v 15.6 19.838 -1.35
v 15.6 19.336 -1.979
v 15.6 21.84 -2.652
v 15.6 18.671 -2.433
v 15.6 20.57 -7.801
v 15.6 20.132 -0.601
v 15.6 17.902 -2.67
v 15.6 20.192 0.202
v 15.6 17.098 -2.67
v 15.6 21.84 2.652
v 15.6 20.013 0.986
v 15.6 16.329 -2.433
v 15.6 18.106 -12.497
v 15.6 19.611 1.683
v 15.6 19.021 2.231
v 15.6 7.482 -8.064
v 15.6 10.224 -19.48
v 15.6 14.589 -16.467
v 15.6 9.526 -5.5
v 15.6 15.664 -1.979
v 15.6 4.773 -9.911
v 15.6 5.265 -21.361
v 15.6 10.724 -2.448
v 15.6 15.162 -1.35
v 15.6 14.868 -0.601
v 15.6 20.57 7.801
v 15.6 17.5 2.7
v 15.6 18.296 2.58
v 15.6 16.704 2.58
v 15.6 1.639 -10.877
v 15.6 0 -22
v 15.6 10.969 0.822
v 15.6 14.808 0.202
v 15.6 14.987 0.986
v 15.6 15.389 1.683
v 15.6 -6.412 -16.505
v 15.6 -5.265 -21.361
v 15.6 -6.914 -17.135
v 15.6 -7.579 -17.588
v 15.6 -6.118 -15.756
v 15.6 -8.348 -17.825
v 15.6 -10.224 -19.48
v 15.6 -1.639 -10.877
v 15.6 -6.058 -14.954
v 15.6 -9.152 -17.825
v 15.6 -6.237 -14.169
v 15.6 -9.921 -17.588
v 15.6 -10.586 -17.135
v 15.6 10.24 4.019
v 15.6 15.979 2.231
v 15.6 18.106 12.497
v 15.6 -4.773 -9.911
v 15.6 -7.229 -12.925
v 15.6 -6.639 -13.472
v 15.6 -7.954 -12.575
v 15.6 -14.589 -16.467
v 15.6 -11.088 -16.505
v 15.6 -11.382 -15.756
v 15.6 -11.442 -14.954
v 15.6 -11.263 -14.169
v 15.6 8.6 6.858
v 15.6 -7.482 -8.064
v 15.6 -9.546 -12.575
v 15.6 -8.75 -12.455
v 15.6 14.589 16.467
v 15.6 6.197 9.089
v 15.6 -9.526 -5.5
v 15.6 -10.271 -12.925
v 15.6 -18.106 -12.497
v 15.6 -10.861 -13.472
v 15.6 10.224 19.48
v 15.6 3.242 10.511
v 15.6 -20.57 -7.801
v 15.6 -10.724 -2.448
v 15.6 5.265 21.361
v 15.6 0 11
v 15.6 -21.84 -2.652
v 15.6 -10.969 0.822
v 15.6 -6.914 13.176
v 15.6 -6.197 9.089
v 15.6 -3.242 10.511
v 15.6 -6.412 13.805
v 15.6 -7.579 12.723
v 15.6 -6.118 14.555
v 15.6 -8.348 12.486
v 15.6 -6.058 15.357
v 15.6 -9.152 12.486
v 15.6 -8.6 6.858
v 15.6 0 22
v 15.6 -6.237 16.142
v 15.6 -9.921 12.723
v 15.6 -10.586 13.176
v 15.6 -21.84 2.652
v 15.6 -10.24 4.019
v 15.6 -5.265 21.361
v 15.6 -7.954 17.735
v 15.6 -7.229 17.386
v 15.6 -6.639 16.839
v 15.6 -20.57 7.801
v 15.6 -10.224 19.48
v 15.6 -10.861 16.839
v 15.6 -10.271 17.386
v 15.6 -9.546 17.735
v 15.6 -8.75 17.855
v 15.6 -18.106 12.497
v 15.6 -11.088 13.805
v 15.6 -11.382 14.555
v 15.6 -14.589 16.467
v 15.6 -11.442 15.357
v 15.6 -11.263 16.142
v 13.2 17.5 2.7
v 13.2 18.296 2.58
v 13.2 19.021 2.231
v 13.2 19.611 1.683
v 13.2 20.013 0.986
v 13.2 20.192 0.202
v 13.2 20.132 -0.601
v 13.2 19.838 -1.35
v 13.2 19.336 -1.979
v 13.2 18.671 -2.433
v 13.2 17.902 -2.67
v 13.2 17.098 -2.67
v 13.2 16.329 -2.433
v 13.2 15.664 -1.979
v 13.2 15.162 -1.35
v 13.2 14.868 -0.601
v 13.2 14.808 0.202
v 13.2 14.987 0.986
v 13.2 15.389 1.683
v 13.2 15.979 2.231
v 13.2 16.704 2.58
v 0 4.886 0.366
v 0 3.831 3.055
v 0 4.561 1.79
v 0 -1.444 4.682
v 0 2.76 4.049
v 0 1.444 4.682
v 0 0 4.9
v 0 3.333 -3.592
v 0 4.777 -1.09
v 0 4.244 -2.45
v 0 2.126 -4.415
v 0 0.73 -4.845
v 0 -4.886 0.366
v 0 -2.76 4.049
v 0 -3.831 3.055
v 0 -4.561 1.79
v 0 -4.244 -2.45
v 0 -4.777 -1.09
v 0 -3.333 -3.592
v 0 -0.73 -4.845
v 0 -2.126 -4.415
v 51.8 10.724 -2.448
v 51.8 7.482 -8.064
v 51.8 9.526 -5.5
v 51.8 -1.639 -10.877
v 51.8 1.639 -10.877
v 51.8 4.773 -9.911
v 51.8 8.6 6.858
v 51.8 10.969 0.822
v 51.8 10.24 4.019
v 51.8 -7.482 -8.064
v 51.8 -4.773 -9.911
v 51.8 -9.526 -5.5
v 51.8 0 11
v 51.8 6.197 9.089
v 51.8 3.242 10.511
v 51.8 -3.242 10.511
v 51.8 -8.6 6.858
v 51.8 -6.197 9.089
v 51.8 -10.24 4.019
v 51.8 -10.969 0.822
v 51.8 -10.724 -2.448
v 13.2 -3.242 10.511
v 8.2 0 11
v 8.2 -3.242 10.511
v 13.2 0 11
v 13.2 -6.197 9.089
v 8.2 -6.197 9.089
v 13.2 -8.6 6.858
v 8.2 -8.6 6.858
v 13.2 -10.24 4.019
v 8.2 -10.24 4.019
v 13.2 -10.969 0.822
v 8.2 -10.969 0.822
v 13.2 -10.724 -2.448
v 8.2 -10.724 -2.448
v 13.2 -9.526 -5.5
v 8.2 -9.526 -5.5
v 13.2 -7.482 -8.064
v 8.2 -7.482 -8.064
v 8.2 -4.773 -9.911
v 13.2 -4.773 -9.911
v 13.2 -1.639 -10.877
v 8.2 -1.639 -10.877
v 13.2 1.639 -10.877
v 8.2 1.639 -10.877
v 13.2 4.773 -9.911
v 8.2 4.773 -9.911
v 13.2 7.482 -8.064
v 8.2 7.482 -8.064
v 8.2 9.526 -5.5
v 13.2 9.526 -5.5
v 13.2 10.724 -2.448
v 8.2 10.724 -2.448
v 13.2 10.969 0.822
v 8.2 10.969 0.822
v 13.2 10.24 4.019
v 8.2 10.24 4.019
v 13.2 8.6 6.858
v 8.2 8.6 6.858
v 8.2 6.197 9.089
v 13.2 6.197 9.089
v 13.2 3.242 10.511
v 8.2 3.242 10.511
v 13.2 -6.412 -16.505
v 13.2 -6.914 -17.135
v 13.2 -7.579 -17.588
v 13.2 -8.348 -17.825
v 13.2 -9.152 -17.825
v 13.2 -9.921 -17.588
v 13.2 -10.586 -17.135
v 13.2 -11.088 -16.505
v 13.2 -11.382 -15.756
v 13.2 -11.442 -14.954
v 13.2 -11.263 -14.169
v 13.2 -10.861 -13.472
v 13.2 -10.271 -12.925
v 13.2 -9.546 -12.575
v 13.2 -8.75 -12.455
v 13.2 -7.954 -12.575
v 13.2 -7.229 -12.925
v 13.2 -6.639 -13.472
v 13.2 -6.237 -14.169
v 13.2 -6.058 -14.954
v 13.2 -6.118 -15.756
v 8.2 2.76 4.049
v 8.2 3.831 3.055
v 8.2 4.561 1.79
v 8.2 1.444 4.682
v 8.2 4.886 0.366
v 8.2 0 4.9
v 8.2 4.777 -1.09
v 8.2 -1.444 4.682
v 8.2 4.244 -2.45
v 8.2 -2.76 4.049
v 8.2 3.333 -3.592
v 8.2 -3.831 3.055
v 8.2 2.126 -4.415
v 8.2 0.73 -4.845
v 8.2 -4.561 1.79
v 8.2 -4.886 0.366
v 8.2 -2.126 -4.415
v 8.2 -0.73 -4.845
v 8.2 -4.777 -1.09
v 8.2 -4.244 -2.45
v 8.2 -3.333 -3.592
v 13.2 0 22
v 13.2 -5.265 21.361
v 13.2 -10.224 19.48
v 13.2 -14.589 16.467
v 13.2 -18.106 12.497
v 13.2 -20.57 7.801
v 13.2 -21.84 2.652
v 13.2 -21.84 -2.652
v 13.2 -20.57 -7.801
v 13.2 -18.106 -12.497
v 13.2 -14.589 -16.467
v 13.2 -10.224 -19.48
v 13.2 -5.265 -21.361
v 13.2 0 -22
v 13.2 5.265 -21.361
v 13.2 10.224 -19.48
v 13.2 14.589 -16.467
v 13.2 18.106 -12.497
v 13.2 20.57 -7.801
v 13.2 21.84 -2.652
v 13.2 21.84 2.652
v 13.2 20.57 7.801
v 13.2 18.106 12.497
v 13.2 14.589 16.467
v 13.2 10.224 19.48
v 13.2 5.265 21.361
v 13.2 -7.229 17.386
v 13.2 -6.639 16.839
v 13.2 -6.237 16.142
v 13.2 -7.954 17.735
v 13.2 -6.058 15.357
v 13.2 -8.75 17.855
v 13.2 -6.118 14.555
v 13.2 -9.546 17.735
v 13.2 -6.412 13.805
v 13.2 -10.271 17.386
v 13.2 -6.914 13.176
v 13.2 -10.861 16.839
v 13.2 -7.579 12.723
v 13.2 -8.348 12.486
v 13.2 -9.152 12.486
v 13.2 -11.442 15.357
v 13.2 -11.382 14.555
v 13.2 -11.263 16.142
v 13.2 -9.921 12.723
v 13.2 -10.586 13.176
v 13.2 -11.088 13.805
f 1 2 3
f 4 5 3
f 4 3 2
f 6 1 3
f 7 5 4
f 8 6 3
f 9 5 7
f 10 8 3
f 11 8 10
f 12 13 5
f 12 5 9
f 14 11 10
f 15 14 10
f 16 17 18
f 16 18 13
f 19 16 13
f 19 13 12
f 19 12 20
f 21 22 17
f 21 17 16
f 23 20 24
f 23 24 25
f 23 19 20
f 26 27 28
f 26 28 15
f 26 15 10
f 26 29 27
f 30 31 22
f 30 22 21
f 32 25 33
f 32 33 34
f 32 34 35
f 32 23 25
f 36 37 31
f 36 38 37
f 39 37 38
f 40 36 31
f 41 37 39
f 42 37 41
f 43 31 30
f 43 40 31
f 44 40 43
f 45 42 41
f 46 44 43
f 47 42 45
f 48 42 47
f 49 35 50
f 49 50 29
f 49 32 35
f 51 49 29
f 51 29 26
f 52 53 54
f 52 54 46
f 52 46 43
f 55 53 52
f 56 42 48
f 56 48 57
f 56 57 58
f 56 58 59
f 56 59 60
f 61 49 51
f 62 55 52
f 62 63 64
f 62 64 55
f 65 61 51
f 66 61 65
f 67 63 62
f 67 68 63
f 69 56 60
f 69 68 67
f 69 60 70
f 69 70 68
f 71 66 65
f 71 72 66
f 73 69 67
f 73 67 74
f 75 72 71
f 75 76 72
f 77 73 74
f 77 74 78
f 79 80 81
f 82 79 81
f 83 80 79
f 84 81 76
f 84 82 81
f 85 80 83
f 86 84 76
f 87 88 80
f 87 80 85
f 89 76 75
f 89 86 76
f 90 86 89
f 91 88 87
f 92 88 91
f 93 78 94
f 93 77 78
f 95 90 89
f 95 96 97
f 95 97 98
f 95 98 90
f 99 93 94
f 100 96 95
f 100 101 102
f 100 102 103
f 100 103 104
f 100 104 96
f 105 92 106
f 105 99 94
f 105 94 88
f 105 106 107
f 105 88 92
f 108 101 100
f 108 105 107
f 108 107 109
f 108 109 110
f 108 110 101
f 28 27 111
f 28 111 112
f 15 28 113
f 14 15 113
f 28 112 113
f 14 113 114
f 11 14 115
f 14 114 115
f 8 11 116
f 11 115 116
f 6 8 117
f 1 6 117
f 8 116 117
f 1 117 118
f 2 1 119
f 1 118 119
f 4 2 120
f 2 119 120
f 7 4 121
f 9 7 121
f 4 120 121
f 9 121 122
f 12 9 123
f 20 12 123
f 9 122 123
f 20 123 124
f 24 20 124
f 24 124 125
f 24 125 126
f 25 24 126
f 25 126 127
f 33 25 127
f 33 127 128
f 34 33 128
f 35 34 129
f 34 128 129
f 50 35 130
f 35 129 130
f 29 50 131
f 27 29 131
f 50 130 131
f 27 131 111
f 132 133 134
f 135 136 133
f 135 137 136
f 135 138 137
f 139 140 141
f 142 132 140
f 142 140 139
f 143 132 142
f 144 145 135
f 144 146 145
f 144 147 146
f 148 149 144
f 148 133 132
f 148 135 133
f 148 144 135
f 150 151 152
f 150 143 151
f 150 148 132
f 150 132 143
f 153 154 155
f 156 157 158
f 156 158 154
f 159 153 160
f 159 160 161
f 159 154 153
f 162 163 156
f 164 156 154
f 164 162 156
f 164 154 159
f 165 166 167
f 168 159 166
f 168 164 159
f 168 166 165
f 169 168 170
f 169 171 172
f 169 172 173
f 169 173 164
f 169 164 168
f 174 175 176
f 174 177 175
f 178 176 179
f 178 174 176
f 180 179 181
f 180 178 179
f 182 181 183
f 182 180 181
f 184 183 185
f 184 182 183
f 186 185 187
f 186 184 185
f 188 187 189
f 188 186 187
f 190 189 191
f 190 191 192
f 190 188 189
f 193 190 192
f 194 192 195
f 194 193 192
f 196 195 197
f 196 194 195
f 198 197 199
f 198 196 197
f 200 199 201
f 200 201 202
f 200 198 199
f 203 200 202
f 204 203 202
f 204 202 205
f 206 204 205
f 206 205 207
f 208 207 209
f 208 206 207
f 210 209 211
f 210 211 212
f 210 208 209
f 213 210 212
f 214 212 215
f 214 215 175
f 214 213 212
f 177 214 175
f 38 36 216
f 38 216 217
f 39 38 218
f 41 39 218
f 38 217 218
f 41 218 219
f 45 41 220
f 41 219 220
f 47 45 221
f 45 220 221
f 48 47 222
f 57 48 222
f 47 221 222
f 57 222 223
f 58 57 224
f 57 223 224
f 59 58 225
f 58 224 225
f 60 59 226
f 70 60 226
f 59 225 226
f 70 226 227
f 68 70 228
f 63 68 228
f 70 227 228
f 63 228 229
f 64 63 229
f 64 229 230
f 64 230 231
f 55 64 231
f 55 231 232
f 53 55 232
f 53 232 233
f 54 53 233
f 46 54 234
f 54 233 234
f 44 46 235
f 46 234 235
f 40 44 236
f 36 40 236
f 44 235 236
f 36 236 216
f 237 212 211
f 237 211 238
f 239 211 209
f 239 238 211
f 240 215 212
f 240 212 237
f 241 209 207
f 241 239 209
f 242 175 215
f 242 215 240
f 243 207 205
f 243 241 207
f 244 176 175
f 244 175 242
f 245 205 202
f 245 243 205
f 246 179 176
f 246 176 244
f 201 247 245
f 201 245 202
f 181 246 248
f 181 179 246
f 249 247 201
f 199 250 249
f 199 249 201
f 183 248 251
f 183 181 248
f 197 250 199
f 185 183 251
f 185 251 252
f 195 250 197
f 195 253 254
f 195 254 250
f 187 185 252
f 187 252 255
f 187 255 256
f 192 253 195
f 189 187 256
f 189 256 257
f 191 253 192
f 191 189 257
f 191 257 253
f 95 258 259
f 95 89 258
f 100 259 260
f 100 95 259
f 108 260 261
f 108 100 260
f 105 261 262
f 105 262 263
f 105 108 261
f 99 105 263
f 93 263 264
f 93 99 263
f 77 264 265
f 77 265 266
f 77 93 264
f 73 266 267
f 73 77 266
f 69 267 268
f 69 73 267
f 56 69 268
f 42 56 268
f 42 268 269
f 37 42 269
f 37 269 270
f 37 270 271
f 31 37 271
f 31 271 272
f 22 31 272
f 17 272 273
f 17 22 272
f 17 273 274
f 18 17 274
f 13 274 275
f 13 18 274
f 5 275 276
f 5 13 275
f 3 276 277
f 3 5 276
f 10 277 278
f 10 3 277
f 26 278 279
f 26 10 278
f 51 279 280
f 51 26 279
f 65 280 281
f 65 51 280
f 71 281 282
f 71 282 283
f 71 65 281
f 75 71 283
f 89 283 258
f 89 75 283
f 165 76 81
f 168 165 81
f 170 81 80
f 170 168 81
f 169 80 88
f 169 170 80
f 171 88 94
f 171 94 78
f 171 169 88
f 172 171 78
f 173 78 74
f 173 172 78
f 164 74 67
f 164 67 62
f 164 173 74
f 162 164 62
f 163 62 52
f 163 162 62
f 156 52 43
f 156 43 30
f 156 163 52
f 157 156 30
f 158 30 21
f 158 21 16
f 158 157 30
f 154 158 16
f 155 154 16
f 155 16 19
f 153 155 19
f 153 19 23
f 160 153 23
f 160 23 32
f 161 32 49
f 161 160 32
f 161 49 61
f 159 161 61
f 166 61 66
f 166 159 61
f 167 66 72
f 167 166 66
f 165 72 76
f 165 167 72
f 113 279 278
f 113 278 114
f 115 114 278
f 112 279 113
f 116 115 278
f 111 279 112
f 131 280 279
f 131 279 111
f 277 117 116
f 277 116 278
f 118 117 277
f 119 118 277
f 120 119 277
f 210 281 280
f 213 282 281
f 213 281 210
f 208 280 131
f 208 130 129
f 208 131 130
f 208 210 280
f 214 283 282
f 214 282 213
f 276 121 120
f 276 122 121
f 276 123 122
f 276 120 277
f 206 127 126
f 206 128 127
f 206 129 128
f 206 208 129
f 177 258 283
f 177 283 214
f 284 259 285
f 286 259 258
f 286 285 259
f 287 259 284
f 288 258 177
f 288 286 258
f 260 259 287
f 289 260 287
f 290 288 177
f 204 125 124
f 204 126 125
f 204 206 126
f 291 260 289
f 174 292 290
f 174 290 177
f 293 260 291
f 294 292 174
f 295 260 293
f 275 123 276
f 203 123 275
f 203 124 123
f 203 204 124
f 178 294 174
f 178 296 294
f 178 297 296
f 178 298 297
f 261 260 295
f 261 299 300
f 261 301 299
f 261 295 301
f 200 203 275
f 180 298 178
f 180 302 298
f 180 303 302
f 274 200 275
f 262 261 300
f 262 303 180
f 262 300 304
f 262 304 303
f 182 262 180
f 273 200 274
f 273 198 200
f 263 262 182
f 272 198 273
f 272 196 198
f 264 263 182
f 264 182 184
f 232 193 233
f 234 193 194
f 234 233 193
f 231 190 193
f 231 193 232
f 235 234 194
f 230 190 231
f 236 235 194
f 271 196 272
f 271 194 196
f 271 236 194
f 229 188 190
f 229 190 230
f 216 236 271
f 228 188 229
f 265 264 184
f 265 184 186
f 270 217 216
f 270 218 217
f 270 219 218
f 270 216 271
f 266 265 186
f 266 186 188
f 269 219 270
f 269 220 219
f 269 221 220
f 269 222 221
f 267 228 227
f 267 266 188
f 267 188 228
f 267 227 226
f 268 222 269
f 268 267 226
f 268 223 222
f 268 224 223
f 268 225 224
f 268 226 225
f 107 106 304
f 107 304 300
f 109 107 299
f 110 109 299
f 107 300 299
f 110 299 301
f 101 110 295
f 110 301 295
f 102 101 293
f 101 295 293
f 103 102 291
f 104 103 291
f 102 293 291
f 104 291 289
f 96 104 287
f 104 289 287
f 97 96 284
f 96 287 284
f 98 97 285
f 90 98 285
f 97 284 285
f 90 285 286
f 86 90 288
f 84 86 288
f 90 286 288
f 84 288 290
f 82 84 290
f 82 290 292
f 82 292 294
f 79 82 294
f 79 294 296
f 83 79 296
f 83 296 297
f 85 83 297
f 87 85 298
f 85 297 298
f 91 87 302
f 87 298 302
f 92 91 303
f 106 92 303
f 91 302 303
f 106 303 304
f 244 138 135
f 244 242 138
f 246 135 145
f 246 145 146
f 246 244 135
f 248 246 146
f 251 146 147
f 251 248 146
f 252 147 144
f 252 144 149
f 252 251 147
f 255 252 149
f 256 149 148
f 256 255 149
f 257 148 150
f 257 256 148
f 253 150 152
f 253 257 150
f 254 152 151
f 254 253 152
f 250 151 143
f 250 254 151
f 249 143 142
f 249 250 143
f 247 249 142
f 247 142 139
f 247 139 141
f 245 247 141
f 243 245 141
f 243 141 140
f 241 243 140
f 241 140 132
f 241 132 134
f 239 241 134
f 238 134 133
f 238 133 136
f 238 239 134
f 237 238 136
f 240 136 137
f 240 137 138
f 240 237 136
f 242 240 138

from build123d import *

# Parameters (mm, degrees)
SKETCH_2_R               = 2.7
CUT_EXTRUDE_1_DEPTH      = 50.57781762
PATTERN_CIRCULAR_1_COUNT = 3


with BuildPart() as part:
    # 草图1 → 旋转1 (revolve)
    with BuildSketch(Plane.XY, mode=Mode.PRIVATE) as revolve_1_sk:
        Polygon((0, 0), (0, 4.9), (8.2, 4.9), (8.2, 11), (13.2, 11), (13.2, 22), (15.6, 22), (15.6, 11), (51.8, 11), (51.8, 0), align=None)
    revolve(revolve_1_sk.sketch.rotate(Axis((0, 0, 0), (1, 0, 0)), 90), axis=Axis((0, 0, 0), (1, 0, 0)))

    # 草图2 → 切除-拉伸1 (cut, symmetric)
    with BuildSketch(Plane.ZY.offset(-13.2)):
        with Locations((0, 17.5)):
            Circle(SKETCH_2_R)
    cut_extrude_1 = extrude(amount=CUT_EXTRUDE_1_DEPTH, both=True, mode=Mode.SUBTRACT)

    # 阵列(圆周)1: 切除-拉伸1 ×3 about axis
    pattern_circular_1_axis = Axis((0, 0, 0), (1, 0, 0))
    for i in range(1, PATTERN_CIRCULAR_1_COUNT):
        add(cut_extrude_1.rotate(pattern_circular_1_axis, i * 360 / PATTERN_CIRCULAR_1_COUNT), mode=Mode.SUBTRACT)


solid = part.part
